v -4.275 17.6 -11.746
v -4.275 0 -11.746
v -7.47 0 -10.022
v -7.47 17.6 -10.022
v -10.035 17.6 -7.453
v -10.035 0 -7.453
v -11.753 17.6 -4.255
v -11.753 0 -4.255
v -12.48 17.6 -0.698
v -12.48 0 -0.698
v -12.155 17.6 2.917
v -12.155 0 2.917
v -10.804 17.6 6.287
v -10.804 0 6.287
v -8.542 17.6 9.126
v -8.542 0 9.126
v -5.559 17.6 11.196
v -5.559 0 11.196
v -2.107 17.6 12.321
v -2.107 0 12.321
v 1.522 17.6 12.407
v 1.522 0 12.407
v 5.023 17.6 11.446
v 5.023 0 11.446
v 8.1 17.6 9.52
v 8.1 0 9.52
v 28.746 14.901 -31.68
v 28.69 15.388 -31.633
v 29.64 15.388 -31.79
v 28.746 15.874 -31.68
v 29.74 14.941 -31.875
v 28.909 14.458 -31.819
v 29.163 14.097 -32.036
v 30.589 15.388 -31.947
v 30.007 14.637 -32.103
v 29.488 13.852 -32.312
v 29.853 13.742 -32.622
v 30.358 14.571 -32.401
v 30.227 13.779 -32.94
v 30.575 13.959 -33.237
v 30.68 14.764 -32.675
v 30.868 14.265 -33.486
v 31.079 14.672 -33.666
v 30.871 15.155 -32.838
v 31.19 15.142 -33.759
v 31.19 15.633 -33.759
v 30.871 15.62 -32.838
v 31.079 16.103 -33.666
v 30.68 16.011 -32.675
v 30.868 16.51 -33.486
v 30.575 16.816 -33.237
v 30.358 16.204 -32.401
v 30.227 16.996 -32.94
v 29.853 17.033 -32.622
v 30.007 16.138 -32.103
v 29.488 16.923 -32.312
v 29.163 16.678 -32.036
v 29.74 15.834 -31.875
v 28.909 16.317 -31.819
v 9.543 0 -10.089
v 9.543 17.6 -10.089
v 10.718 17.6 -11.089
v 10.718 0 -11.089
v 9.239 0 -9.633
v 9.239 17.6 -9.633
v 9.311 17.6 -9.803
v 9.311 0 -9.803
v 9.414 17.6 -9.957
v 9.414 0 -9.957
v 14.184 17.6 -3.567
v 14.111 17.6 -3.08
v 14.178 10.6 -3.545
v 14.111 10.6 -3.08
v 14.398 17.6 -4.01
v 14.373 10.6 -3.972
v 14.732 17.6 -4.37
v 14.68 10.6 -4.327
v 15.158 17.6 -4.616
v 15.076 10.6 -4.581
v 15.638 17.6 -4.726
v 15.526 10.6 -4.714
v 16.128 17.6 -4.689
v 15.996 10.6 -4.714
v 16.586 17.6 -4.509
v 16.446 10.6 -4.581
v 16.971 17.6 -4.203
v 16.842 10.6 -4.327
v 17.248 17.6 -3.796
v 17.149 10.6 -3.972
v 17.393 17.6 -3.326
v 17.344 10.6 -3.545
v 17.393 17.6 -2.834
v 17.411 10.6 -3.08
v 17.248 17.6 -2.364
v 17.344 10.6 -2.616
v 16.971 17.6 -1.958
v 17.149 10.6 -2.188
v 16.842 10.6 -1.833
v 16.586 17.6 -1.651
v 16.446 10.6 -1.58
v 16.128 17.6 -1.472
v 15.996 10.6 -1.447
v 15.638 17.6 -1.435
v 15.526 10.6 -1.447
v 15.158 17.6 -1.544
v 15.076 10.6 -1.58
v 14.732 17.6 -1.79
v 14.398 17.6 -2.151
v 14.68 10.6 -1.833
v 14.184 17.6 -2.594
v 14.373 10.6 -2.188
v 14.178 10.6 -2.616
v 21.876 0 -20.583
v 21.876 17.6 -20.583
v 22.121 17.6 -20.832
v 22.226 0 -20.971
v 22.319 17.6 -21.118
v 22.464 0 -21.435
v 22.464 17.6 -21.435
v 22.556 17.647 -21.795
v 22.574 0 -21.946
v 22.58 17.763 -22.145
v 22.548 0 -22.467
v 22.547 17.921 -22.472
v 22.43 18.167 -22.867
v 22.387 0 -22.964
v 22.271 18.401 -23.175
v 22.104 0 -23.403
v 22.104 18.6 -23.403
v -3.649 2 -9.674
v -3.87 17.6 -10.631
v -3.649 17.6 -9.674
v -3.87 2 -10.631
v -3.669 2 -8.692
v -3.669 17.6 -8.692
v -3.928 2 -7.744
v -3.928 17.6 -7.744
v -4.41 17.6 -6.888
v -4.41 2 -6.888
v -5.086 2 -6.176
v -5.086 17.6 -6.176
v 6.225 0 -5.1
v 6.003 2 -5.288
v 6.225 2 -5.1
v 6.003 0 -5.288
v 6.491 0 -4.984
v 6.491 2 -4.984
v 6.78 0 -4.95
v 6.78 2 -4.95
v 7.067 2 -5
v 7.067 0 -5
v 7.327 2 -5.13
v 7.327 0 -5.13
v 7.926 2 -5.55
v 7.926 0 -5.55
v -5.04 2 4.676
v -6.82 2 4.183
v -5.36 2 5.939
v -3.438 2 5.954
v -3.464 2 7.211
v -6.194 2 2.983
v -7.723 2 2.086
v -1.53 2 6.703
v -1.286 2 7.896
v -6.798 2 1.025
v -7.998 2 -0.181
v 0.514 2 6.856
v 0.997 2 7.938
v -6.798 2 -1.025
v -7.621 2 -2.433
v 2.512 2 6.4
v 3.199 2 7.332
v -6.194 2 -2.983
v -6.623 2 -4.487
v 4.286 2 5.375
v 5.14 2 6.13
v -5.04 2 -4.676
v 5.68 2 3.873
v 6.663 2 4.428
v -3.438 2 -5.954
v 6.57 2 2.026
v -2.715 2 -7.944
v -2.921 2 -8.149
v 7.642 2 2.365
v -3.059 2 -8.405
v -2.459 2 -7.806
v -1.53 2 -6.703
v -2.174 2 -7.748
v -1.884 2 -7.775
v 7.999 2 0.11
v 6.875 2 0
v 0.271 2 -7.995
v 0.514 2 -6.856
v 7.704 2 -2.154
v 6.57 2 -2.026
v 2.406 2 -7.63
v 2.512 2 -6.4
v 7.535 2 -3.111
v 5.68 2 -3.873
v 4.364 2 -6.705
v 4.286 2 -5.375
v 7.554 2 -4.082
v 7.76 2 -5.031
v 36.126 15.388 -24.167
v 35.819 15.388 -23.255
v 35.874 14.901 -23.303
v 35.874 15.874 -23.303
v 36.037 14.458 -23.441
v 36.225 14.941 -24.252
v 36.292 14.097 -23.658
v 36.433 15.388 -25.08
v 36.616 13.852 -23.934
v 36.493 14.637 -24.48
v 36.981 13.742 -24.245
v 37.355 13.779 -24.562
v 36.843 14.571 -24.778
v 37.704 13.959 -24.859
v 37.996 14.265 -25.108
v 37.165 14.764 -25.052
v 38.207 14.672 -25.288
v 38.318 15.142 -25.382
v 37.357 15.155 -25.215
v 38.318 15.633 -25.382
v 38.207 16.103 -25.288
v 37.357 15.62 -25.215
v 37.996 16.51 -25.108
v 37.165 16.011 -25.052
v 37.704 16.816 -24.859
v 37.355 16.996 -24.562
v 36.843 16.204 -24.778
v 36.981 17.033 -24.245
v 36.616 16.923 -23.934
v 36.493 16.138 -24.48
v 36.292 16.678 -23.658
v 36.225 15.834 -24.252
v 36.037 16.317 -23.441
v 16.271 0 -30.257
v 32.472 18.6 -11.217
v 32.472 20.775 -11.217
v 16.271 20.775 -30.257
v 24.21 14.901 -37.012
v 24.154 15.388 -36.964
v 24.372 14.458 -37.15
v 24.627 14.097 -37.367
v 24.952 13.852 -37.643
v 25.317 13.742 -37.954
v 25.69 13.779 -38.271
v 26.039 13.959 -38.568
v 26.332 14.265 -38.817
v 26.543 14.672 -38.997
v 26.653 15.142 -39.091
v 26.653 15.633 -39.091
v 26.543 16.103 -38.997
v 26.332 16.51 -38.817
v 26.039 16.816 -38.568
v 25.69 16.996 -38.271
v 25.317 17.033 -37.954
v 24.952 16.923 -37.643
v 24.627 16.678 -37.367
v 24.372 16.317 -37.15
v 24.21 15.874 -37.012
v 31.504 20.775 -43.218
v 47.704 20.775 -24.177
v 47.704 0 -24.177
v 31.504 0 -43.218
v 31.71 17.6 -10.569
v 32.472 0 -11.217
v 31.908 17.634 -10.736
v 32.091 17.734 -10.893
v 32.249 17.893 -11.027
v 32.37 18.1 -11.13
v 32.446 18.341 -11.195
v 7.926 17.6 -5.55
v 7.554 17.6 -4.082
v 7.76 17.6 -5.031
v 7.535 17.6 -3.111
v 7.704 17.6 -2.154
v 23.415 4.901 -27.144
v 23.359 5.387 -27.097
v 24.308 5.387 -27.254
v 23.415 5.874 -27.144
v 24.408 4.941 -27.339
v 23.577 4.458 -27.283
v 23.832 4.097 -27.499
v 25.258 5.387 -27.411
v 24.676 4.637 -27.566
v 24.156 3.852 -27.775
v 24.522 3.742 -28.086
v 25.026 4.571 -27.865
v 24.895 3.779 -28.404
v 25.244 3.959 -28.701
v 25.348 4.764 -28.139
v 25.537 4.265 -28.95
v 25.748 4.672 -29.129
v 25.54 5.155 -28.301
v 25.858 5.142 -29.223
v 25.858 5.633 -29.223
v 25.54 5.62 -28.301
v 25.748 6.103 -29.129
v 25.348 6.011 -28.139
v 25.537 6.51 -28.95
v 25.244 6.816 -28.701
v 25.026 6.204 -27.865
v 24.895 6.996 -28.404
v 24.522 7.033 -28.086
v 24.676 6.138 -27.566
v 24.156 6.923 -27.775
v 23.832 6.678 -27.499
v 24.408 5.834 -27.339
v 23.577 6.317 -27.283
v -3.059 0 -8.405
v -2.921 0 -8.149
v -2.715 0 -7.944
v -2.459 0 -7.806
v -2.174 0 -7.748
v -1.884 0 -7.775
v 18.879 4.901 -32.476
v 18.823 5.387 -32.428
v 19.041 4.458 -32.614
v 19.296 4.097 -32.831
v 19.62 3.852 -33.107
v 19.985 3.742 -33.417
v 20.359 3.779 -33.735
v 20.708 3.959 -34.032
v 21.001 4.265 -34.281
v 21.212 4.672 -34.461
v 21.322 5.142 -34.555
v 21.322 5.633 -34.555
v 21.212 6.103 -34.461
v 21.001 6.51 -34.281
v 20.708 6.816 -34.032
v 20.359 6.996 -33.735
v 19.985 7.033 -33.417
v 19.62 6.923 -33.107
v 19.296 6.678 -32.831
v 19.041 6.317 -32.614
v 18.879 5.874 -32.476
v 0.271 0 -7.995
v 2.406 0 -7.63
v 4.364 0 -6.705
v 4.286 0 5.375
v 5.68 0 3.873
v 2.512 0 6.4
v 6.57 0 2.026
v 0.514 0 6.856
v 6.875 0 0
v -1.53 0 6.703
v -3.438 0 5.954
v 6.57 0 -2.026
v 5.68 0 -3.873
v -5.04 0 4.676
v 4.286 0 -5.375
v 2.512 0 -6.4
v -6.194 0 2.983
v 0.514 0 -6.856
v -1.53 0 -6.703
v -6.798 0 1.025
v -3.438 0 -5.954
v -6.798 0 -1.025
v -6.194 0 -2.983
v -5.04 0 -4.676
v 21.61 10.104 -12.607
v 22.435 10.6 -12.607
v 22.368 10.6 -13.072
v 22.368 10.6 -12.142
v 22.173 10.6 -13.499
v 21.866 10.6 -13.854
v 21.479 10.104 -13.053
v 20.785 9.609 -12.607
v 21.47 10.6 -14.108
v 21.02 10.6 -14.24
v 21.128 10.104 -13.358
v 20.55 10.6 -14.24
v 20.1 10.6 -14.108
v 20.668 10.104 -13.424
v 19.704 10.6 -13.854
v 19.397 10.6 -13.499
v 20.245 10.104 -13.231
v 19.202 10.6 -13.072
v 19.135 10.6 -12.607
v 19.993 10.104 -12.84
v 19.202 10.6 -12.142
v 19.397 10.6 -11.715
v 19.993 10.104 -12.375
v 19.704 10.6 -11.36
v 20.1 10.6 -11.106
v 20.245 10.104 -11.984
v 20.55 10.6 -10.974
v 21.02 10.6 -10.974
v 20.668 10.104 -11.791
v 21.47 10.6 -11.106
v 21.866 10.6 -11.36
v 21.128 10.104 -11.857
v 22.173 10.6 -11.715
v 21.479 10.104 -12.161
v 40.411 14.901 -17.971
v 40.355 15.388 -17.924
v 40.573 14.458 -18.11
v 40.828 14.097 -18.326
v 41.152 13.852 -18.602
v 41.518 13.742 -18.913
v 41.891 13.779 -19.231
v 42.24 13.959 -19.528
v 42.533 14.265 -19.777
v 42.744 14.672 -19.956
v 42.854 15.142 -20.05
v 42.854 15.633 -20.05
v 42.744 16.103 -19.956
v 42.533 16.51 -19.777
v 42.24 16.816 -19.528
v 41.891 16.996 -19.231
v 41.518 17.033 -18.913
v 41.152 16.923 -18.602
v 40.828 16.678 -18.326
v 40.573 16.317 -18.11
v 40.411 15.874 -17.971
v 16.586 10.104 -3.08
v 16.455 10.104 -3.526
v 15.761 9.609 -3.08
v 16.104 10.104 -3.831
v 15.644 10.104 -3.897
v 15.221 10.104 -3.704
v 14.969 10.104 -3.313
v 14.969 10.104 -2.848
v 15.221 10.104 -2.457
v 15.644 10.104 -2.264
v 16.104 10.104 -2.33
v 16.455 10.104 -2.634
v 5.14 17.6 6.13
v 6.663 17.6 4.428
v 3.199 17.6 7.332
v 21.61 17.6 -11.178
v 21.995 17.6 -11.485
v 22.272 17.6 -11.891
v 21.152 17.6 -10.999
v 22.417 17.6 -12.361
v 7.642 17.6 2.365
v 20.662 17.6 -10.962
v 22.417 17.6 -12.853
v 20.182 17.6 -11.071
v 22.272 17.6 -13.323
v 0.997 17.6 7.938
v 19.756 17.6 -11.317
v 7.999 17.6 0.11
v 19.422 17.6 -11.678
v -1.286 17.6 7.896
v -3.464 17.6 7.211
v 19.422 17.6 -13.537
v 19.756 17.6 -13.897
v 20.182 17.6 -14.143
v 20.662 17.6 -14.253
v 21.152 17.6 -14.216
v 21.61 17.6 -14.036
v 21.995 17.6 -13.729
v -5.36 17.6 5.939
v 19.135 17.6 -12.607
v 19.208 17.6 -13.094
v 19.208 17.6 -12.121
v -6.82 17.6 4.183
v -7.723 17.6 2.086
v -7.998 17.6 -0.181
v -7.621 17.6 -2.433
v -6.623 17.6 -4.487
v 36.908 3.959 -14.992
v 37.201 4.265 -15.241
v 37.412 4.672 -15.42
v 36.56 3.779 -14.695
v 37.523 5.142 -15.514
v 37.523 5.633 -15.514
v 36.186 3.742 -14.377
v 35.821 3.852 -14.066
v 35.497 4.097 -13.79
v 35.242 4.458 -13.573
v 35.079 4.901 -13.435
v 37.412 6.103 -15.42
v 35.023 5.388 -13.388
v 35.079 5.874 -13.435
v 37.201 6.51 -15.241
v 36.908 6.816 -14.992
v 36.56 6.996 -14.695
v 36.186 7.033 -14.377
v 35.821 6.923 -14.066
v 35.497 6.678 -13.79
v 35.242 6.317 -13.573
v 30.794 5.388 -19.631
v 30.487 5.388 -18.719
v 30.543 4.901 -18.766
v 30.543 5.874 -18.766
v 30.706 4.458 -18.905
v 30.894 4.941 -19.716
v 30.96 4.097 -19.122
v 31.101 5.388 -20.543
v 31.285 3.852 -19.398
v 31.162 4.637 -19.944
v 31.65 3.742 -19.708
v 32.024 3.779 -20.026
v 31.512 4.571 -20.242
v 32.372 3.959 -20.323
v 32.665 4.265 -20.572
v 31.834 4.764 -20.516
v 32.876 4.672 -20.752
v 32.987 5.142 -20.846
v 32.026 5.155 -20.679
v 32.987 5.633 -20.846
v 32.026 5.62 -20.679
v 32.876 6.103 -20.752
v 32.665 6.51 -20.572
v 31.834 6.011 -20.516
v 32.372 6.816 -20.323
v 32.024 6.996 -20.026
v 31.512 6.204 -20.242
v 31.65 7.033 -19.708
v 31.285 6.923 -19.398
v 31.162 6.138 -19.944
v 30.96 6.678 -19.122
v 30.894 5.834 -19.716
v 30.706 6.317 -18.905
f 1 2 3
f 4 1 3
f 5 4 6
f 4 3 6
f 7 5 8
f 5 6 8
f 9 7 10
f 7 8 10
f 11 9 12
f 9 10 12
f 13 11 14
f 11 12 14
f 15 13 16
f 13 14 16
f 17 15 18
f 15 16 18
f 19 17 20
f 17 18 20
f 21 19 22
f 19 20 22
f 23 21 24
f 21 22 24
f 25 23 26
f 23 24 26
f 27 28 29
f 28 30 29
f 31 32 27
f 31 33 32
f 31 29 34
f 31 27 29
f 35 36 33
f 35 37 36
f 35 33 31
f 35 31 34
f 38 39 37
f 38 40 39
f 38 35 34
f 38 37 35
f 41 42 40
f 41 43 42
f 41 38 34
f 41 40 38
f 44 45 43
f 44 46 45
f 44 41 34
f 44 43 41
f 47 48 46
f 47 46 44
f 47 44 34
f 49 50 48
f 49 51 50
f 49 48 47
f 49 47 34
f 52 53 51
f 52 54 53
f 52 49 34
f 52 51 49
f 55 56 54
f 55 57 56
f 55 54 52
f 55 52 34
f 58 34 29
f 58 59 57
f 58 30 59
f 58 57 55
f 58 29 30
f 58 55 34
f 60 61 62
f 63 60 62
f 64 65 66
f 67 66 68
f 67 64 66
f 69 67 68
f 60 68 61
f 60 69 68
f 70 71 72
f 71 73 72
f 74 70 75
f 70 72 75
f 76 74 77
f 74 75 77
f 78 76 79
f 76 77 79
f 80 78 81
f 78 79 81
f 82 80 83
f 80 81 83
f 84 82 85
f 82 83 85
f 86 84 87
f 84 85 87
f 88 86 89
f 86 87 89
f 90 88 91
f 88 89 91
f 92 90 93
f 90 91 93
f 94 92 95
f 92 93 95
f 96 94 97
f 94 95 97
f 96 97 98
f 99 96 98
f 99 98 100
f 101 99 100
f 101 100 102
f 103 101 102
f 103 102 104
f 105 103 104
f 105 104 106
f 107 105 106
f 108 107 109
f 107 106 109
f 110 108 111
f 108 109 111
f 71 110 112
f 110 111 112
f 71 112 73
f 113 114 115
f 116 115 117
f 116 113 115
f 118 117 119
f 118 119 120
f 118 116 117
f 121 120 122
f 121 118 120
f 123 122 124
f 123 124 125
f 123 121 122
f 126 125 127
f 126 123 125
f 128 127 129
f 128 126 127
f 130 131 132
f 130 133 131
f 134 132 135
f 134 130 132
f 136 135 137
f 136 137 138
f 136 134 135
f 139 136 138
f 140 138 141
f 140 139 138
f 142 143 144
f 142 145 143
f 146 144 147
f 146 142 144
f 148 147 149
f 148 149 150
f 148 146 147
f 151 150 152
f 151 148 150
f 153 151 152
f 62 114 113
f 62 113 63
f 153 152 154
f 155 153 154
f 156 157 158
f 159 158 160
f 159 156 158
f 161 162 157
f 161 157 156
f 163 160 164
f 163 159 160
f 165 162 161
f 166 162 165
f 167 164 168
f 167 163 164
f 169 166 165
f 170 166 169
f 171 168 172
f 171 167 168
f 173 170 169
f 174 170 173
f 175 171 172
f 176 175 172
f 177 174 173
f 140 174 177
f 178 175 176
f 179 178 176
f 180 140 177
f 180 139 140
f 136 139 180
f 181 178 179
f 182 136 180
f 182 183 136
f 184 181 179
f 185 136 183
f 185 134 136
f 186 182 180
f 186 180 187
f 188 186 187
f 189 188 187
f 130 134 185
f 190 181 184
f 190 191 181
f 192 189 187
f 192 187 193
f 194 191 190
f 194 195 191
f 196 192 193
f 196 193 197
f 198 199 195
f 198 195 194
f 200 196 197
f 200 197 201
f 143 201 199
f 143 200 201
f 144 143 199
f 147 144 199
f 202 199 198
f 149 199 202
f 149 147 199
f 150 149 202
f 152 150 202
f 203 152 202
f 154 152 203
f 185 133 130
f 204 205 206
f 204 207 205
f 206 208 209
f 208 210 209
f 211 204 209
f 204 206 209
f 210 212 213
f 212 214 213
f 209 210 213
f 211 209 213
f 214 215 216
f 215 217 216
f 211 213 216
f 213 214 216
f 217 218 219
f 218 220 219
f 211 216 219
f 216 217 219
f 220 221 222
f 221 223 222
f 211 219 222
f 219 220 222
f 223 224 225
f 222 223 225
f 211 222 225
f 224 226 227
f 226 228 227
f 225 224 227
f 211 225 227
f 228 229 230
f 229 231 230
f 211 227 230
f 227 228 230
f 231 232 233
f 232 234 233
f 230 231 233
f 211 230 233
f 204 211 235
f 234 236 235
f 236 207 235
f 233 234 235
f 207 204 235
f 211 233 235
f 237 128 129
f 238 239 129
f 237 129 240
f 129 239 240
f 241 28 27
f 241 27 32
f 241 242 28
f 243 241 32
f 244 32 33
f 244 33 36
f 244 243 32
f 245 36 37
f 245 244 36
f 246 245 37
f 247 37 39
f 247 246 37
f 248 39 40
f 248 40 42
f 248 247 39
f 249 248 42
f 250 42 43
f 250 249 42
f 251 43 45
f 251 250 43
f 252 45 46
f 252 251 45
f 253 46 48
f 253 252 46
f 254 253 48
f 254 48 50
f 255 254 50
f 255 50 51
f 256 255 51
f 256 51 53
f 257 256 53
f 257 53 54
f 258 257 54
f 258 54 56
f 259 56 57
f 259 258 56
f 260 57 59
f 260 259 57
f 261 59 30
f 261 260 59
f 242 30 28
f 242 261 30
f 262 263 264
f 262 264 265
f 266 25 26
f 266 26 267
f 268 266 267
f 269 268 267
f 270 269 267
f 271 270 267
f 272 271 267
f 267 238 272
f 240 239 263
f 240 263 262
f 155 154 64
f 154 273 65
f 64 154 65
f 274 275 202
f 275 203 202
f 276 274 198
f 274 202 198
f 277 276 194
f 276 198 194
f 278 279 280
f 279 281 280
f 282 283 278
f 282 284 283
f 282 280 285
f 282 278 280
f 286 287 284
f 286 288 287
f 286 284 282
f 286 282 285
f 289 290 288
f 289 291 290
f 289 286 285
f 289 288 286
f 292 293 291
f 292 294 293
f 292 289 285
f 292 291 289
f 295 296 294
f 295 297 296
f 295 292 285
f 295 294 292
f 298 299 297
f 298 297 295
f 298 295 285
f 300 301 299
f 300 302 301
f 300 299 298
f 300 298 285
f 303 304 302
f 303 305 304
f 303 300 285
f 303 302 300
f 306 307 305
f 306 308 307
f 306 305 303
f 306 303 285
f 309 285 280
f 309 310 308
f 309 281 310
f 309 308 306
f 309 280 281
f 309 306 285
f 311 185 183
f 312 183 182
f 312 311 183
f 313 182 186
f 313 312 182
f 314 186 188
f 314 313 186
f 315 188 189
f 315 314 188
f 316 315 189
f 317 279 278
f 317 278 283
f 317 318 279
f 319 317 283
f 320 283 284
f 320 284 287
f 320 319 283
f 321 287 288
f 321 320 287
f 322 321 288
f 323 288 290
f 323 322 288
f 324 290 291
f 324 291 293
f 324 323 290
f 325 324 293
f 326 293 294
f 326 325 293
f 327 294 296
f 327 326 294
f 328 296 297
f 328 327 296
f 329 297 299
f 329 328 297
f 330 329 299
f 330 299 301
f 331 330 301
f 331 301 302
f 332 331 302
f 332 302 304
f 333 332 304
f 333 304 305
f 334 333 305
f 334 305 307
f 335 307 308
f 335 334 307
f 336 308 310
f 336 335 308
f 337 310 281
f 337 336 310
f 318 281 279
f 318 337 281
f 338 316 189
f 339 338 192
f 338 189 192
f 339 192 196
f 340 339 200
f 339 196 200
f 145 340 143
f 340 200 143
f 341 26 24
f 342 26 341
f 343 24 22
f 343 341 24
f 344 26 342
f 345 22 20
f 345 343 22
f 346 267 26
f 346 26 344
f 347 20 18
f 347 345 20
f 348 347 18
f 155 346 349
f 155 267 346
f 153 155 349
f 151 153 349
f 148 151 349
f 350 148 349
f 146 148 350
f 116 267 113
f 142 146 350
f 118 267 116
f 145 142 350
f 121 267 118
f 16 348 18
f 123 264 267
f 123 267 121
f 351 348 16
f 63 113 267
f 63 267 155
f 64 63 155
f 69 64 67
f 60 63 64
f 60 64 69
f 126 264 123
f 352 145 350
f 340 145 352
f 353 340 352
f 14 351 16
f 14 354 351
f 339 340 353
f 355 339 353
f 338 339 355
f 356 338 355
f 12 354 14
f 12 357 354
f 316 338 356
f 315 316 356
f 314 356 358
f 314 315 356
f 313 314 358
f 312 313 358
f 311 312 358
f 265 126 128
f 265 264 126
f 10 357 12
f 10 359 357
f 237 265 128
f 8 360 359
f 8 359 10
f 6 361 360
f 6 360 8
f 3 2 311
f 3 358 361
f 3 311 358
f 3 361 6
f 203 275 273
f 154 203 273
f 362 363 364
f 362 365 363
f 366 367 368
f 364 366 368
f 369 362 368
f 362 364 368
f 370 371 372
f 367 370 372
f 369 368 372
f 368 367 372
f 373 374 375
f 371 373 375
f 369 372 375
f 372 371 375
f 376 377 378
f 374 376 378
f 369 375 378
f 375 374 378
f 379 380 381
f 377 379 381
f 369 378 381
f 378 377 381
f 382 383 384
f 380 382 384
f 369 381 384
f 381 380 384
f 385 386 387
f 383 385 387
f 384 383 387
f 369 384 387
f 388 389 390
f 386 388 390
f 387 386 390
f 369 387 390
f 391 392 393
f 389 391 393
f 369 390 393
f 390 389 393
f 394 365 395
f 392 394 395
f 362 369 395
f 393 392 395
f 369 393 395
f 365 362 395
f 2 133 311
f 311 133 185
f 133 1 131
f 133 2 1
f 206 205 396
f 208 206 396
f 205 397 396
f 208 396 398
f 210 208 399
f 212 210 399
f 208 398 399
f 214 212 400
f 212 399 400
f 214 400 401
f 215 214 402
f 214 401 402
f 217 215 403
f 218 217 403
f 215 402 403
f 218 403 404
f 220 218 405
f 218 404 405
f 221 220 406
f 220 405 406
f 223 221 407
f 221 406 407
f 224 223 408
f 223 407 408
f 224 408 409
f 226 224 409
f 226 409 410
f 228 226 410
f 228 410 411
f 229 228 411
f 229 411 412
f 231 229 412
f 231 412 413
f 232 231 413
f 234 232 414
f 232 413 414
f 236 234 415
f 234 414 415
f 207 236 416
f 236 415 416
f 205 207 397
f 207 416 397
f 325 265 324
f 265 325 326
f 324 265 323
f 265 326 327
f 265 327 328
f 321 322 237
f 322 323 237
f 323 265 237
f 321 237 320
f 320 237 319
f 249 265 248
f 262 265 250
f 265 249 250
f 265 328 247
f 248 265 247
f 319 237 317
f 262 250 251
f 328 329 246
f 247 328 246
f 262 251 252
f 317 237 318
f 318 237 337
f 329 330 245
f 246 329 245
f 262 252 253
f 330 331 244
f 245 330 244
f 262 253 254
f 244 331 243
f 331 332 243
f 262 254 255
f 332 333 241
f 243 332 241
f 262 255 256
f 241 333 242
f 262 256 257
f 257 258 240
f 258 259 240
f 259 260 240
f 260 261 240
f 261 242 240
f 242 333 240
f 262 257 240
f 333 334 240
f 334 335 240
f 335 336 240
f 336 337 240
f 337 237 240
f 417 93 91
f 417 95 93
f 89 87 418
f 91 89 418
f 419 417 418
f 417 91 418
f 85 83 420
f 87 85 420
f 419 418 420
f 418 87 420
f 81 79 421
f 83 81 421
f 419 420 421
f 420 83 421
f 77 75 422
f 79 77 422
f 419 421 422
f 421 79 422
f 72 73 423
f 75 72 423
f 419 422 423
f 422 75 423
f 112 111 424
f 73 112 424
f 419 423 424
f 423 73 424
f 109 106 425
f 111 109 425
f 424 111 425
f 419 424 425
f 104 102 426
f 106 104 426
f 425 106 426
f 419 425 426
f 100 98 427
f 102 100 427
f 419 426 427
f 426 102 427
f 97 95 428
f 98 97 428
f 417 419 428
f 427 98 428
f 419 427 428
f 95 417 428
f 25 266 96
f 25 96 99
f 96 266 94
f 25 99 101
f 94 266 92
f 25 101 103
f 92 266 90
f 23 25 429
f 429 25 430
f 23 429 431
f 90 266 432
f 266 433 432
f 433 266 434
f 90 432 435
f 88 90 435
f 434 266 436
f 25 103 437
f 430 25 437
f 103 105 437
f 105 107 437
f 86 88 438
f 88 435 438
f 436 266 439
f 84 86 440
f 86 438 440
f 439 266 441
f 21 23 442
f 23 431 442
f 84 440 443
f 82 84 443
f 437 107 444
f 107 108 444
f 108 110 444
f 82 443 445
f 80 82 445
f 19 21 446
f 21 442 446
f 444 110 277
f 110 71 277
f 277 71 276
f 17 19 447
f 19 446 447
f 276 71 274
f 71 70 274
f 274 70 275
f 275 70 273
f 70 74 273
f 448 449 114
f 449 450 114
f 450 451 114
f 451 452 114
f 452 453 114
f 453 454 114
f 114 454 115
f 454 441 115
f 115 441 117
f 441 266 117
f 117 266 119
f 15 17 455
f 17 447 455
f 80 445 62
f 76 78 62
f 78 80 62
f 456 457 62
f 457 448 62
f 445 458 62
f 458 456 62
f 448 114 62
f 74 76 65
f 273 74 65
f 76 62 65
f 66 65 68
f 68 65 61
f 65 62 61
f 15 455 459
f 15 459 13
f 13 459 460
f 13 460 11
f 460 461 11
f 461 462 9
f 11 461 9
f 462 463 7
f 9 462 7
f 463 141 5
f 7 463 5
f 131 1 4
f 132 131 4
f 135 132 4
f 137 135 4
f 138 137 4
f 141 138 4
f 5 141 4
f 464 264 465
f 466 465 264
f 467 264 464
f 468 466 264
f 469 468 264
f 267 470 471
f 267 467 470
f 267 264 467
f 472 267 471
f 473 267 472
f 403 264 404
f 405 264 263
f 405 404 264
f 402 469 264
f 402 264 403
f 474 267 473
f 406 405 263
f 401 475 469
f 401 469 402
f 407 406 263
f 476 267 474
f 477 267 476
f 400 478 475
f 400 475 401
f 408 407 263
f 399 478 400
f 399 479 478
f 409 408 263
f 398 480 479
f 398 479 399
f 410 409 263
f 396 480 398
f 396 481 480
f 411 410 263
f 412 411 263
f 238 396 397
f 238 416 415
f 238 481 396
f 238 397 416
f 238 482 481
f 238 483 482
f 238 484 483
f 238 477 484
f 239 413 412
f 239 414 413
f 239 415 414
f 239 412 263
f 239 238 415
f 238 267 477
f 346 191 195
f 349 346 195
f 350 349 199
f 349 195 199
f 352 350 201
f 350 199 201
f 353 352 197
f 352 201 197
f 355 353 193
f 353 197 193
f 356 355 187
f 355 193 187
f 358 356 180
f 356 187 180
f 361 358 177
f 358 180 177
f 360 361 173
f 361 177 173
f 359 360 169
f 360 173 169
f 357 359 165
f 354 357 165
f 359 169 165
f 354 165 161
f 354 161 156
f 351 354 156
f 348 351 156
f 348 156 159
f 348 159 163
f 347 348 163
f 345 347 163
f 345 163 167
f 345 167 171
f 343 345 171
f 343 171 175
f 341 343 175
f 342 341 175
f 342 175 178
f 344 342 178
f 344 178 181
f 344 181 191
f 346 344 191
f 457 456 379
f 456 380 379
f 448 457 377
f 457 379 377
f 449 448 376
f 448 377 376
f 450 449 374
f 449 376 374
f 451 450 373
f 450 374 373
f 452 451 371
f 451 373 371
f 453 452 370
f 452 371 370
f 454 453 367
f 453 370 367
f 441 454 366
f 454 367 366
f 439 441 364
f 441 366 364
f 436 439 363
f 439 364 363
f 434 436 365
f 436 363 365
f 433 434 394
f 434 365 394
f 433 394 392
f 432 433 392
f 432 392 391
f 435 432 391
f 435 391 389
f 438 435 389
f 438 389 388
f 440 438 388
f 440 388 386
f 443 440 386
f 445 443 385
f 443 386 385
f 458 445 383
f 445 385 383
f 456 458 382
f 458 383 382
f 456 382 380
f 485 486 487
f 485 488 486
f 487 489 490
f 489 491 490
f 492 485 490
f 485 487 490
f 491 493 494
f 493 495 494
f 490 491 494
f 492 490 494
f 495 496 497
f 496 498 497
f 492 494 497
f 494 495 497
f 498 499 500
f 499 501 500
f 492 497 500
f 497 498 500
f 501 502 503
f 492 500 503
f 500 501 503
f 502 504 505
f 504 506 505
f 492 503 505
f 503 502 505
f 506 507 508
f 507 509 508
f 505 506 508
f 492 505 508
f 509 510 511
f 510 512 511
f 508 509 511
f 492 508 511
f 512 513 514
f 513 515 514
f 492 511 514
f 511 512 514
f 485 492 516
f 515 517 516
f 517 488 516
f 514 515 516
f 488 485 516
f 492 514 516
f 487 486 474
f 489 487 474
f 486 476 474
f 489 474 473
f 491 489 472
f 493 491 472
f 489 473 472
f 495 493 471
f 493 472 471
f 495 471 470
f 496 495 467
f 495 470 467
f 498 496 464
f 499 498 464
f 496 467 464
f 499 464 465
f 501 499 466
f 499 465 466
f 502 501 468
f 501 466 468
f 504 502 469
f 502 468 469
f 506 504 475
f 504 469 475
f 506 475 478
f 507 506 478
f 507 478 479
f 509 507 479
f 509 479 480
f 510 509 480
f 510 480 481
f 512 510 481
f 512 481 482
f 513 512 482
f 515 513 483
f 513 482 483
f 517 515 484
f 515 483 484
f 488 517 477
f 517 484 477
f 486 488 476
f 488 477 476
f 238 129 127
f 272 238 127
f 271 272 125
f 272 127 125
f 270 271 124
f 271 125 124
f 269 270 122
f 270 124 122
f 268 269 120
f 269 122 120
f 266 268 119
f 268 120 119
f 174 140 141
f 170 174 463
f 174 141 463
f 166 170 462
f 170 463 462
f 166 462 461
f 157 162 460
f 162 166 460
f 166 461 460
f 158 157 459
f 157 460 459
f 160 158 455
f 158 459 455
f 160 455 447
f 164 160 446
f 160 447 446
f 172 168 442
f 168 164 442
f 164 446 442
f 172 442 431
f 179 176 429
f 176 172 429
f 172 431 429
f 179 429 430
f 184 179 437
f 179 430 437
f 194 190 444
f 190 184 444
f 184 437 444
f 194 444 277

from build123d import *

# Parameters (mm, degrees)
SKETCH1_R                      = 12.5
BOSS_EXTRUDE1_DEPTH            = 17.6
SKETCH2_R                      = 6.875
CUT_EXTRUDE1_DEPTH             = 50.8
SKETCH3_R                      = 8
CUT_EXTRUDE3_DEPTH             = 15.6
CUT_EXTRUDE4_DEPTH             = 18.6
BOSS_EXTRUDE2_DEPTH            = 17.6
FILLET1_R                      = 4
SKETCH6_W                      = 25
SKETCH6_H                      = 20.775
BOSS_EXTRUDE3_DEPTH            = 20
M4X0_7_TAPPED_HOLE2_AT_2_COUNT = 2
M4X0_7_TAPPED_HOLE2_AT_2_PITCH = 12.206555616
M4X0_7_TAPPED_HOLE1_D          = 3.3
M4X0_7_TAPPED_HOLE1_DEPTH      = 7
M4X0_7_TAPPED_HOLE1_TIP        = 0.991420021
FILLET4_R                      = 1
FILLET6_R                      = 1
FILLET7_R                      = 2
CUT_EXTRUDE6_DEPTH             = 15.6
FILLET8_R                      = 5
BOSS_EXTRUDE4_DEPTH            = 17.6
FILLET11_R                     = 1


with BuildPart() as part:
    # Sketch1 → Boss-Extrude1 (new body)
    with BuildSketch(Plane(origin=(0, 0, 0), x_dir=(1, 0, 0), z_dir=(0, 1, 0))):
        Circle(SKETCH1_R)
    extrude(amount=BOSS_EXTRUDE1_DEPTH)

    # Sketch2 → Cut-Extrude1 (cut)
    with BuildSketch(Plane(origin=(0, 17.6, 0), x_dir=(1, 0, 0), z_dir=(0, 1, 0))):
        Circle(SKETCH2_R)
    extrude(amount=-CUT_EXTRUDE1_DEPTH, mode=Mode.SUBTRACT)

    # Sketch3 → Cut-Extrude3 (cut)
    with BuildSketch(Plane(origin=(0, 17.6, 0), x_dir=(1, 0, 0), z_dir=(0, 1, 0))):
        Circle(SKETCH3_R)
    extrude(amount=-CUT_EXTRUDE3_DEPTH, mode=Mode.SUBTRACT)

    # Sketch4 → Cut-Extrude4 (cut, through all)
    with BuildSketch(Plane(origin=(0, 17.6, 0), x_dir=(1, 0, 0), z_dir=(0, 1, 0))):
        with BuildLine():
            ThreePointArc((-2.736161147, 7.517540966), (2.405646396, 7.629735606), (6.553216354, 4.588611491))
            Line((6.553216354, 4.588611491), (10.239400554, 7.169705454))
            ThreePointArc((10.239400554, 7.169705454), (3.758822494, 11.921461884), (-4.275251792, 11.74615776))
            Line((-4.275251792, 11.74615776), (-2.736161147, 7.517540966))
        make_face()
    extrude(amount=-CUT_EXTRUDE4_DEPTH, mode=Mode.SUBTRACT)

    # Sketch5 → Boss-Extrude2 (add, through all)
    with BuildSketch(Plane(origin=(0, 17.6, 0), x_dir=(1, 0, 0), z_dir=(0, 1, 0))):
        with BuildLine():
            Line((8.100371818, -9.520187835), (32.472052675, 11.216764019))
            Line((32.472052675, 11.216764019), (23.399636239, 21.879374394))
            Line((23.399636239, 21.879374394), (10.717665156, 11.088759446))
            Line((10.717665156, 11.088759446), (10.239400554, 7.169705454))
            ThreePointArc((10.239400554, 7.169705454), (12.398586499, -1.589041484), (8.100371818, -9.520187835))
        make_face()
    extrude(amount=-BOSS_EXTRUDE2_DEPTH)

    # Fillet1
    fillet1_edges = [part.edges().sort_by_distance(p)[0] for p in [
        (-2.736161147, 9.8, -7.517540966),
    ]]
    fillet(fillet1_edges, radius=FILLET1_R)

    # Sketch6 → Boss-Extrude3 (add)
    with BuildSketch(Plane(origin=(24.371680857, 0, -20.736951854), x_dir=(-0.648029745, 0, -0.761615027), z_dir=(0.761615027, 0, -0.648029745))):
        with Locations((0, 10.3875)):
            Rectangle(SKETCH6_W, SKETCH6_H)
    extrude(amount=BOSS_EXTRUDE3_DEPTH)

    # Sketch9 → M4x0.7 Tapped Hole2 (revolve, cut)
    with BuildSketch(Plane(origin=(25.410689361, 15.3875, -38.033496634), x_dir=(-0.761615027, 0, 0.648029745), z_dir=(0, 1, 0))):
        Polygon((0, 0), (0, 7.991420021), (1.65, 7), (1.65, 0), align=None)
    m4x0_7_tapped_hole2 = revolve(axis=Axis((21.295700477, 15.3875, -42.869752054), (0.648029745, 0, 0.761615027)), mode=Mode.SUBTRACT)

    # M4x0.7 Tapped Hole2 at 2: M4x0.7 Tapped Hole2 ×2
    with Locations(*[Vector(-0.436757539, -0.819231921, 0.371620657) * (i * M4X0_7_TAPPED_HOLE2_AT_2_PITCH) for i in range(1, M4X0_7_TAPPED_HOLE2_AT_2_COUNT)]):
        add(m4x0_7_tapped_hole2, mode=Mode.SUBTRACT)

    # Mirror1: M4x0.7 Tapped Hole2 across plane
    add(m4x0_7_tapped_hole2.mirror(Plane(origin=(0, 0, 0), x_dir=(-0.761615027, 0, 0.648029745), z_dir=(-0.648029745, 0, -0.761615027))), mode=Mode.SUBTRACT)

    # Mirror1 copy 1 sketch → Mirror1 copy 1 (revolve, cut)
    with BuildSketch(Plane(origin=(36.280127809, 5.3875, -14.456912746), x_dir=(-0.761615027, 0, 0.648029745), z_dir=(0, 1, 0))):
        Polygon((0, 0), (0, -7.991420021), (1.65, -7), (1.65, 0), align=None)
    revolve(axis=Axis((40.395116693, 5.3875, -9.620657326), (0.648029745, 0, 0.761615027)), mode=Mode.SUBTRACT)

    # M4x0.7 Tapped Hole1
    with Locations(Plane(origin=(0, 17.6, 0), x_dir=(1, 0, 0), z_dir=(0, 1, 0))):
        with Locations((20.785019884, 12.607162838), (15.760988598, 3.080405276)):
            Hole(M4X0_7_TAPPED_HOLE1_D / 2, depth=M4X0_7_TAPPED_HOLE1_DEPTH)
            with Locations((0, 0, -(M4X0_7_TAPPED_HOLE1_DEPTH + M4X0_7_TAPPED_HOLE1_TIP / 2))):  # 118° drill point
                Cone(0, M4X0_7_TAPPED_HOLE1_D / 2, M4X0_7_TAPPED_HOLE1_TIP, mode=Mode.SUBTRACT)

    # Fillet4
    fillet4_edges = [part.edges().sort_by_distance(p)[0] for p in [
        (27.935844457, 17.6, -16.548069207),
    ]]
    fillet(fillet4_edges, radius=FILLET4_R)

    # Fillet6
    fillet6_edges = [part.edges().sort_by_distance(p)[0] for p in [
        (-2.736161147, 1, -7.517540966),
        (6.553216354, 1, -4.588611491),
    ]]
    fillet(fillet6_edges, radius=FILLET6_R)

    # Fillet7
    fillet7_edges = [part.edges().sort_by_distance(p)[0] for p in [
        (23.399636239, 8.8, -21.879374394),
    ]]
    fillet(fillet7_edges, radius=FILLET7_R)

    # Sketch13 → Cut-Extrude6 (cut)
    with BuildSketch(Plane(origin=(0, 17.6, 0), x_dir=(1, 0, 0), z_dir=(0, 1, 0))):
        Polygon((7.237831979, 3.407900857), (11.336580589, 16.160351586), (5.142300877, 6.128355545), (6.34884573, 4.867459081), align=None)
    extrude(amount=-CUT_EXTRUDE6_DEPTH, mode=Mode.SUBTRACT)

    # Fillet8
    fillet8_edges = [part.edges().sort_by_distance(p)[0] for p in [
        (7.237831979, 9.8, -3.407900857),
    ]]
    fillet(fillet8_edges, radius=FILLET8_R)

    # Sketch14 → Boss-Extrude4 (add)
    with BuildSketch(Plane(origin=(0, 17.6, 0), x_dir=(1, 0, 0), z_dir=(0, 1, 0))):
        Polygon((7.926350274, 5.550090213), (9.325919645, 9.904575236), (10.717665156, 11.088759446), (10.239400554, 7.169705454), align=None)
    extrude(amount=-BOSS_EXTRUDE4_DEPTH)

    # Fillet11
    fillet11_edges = [part.edges().sort_by_distance(p)[0] for p in [
        (9.325919645, 8.8, -9.904575236),
    ]]
    fillet(fillet11_edges, radius=FILLET11_R)


solid = part.part
